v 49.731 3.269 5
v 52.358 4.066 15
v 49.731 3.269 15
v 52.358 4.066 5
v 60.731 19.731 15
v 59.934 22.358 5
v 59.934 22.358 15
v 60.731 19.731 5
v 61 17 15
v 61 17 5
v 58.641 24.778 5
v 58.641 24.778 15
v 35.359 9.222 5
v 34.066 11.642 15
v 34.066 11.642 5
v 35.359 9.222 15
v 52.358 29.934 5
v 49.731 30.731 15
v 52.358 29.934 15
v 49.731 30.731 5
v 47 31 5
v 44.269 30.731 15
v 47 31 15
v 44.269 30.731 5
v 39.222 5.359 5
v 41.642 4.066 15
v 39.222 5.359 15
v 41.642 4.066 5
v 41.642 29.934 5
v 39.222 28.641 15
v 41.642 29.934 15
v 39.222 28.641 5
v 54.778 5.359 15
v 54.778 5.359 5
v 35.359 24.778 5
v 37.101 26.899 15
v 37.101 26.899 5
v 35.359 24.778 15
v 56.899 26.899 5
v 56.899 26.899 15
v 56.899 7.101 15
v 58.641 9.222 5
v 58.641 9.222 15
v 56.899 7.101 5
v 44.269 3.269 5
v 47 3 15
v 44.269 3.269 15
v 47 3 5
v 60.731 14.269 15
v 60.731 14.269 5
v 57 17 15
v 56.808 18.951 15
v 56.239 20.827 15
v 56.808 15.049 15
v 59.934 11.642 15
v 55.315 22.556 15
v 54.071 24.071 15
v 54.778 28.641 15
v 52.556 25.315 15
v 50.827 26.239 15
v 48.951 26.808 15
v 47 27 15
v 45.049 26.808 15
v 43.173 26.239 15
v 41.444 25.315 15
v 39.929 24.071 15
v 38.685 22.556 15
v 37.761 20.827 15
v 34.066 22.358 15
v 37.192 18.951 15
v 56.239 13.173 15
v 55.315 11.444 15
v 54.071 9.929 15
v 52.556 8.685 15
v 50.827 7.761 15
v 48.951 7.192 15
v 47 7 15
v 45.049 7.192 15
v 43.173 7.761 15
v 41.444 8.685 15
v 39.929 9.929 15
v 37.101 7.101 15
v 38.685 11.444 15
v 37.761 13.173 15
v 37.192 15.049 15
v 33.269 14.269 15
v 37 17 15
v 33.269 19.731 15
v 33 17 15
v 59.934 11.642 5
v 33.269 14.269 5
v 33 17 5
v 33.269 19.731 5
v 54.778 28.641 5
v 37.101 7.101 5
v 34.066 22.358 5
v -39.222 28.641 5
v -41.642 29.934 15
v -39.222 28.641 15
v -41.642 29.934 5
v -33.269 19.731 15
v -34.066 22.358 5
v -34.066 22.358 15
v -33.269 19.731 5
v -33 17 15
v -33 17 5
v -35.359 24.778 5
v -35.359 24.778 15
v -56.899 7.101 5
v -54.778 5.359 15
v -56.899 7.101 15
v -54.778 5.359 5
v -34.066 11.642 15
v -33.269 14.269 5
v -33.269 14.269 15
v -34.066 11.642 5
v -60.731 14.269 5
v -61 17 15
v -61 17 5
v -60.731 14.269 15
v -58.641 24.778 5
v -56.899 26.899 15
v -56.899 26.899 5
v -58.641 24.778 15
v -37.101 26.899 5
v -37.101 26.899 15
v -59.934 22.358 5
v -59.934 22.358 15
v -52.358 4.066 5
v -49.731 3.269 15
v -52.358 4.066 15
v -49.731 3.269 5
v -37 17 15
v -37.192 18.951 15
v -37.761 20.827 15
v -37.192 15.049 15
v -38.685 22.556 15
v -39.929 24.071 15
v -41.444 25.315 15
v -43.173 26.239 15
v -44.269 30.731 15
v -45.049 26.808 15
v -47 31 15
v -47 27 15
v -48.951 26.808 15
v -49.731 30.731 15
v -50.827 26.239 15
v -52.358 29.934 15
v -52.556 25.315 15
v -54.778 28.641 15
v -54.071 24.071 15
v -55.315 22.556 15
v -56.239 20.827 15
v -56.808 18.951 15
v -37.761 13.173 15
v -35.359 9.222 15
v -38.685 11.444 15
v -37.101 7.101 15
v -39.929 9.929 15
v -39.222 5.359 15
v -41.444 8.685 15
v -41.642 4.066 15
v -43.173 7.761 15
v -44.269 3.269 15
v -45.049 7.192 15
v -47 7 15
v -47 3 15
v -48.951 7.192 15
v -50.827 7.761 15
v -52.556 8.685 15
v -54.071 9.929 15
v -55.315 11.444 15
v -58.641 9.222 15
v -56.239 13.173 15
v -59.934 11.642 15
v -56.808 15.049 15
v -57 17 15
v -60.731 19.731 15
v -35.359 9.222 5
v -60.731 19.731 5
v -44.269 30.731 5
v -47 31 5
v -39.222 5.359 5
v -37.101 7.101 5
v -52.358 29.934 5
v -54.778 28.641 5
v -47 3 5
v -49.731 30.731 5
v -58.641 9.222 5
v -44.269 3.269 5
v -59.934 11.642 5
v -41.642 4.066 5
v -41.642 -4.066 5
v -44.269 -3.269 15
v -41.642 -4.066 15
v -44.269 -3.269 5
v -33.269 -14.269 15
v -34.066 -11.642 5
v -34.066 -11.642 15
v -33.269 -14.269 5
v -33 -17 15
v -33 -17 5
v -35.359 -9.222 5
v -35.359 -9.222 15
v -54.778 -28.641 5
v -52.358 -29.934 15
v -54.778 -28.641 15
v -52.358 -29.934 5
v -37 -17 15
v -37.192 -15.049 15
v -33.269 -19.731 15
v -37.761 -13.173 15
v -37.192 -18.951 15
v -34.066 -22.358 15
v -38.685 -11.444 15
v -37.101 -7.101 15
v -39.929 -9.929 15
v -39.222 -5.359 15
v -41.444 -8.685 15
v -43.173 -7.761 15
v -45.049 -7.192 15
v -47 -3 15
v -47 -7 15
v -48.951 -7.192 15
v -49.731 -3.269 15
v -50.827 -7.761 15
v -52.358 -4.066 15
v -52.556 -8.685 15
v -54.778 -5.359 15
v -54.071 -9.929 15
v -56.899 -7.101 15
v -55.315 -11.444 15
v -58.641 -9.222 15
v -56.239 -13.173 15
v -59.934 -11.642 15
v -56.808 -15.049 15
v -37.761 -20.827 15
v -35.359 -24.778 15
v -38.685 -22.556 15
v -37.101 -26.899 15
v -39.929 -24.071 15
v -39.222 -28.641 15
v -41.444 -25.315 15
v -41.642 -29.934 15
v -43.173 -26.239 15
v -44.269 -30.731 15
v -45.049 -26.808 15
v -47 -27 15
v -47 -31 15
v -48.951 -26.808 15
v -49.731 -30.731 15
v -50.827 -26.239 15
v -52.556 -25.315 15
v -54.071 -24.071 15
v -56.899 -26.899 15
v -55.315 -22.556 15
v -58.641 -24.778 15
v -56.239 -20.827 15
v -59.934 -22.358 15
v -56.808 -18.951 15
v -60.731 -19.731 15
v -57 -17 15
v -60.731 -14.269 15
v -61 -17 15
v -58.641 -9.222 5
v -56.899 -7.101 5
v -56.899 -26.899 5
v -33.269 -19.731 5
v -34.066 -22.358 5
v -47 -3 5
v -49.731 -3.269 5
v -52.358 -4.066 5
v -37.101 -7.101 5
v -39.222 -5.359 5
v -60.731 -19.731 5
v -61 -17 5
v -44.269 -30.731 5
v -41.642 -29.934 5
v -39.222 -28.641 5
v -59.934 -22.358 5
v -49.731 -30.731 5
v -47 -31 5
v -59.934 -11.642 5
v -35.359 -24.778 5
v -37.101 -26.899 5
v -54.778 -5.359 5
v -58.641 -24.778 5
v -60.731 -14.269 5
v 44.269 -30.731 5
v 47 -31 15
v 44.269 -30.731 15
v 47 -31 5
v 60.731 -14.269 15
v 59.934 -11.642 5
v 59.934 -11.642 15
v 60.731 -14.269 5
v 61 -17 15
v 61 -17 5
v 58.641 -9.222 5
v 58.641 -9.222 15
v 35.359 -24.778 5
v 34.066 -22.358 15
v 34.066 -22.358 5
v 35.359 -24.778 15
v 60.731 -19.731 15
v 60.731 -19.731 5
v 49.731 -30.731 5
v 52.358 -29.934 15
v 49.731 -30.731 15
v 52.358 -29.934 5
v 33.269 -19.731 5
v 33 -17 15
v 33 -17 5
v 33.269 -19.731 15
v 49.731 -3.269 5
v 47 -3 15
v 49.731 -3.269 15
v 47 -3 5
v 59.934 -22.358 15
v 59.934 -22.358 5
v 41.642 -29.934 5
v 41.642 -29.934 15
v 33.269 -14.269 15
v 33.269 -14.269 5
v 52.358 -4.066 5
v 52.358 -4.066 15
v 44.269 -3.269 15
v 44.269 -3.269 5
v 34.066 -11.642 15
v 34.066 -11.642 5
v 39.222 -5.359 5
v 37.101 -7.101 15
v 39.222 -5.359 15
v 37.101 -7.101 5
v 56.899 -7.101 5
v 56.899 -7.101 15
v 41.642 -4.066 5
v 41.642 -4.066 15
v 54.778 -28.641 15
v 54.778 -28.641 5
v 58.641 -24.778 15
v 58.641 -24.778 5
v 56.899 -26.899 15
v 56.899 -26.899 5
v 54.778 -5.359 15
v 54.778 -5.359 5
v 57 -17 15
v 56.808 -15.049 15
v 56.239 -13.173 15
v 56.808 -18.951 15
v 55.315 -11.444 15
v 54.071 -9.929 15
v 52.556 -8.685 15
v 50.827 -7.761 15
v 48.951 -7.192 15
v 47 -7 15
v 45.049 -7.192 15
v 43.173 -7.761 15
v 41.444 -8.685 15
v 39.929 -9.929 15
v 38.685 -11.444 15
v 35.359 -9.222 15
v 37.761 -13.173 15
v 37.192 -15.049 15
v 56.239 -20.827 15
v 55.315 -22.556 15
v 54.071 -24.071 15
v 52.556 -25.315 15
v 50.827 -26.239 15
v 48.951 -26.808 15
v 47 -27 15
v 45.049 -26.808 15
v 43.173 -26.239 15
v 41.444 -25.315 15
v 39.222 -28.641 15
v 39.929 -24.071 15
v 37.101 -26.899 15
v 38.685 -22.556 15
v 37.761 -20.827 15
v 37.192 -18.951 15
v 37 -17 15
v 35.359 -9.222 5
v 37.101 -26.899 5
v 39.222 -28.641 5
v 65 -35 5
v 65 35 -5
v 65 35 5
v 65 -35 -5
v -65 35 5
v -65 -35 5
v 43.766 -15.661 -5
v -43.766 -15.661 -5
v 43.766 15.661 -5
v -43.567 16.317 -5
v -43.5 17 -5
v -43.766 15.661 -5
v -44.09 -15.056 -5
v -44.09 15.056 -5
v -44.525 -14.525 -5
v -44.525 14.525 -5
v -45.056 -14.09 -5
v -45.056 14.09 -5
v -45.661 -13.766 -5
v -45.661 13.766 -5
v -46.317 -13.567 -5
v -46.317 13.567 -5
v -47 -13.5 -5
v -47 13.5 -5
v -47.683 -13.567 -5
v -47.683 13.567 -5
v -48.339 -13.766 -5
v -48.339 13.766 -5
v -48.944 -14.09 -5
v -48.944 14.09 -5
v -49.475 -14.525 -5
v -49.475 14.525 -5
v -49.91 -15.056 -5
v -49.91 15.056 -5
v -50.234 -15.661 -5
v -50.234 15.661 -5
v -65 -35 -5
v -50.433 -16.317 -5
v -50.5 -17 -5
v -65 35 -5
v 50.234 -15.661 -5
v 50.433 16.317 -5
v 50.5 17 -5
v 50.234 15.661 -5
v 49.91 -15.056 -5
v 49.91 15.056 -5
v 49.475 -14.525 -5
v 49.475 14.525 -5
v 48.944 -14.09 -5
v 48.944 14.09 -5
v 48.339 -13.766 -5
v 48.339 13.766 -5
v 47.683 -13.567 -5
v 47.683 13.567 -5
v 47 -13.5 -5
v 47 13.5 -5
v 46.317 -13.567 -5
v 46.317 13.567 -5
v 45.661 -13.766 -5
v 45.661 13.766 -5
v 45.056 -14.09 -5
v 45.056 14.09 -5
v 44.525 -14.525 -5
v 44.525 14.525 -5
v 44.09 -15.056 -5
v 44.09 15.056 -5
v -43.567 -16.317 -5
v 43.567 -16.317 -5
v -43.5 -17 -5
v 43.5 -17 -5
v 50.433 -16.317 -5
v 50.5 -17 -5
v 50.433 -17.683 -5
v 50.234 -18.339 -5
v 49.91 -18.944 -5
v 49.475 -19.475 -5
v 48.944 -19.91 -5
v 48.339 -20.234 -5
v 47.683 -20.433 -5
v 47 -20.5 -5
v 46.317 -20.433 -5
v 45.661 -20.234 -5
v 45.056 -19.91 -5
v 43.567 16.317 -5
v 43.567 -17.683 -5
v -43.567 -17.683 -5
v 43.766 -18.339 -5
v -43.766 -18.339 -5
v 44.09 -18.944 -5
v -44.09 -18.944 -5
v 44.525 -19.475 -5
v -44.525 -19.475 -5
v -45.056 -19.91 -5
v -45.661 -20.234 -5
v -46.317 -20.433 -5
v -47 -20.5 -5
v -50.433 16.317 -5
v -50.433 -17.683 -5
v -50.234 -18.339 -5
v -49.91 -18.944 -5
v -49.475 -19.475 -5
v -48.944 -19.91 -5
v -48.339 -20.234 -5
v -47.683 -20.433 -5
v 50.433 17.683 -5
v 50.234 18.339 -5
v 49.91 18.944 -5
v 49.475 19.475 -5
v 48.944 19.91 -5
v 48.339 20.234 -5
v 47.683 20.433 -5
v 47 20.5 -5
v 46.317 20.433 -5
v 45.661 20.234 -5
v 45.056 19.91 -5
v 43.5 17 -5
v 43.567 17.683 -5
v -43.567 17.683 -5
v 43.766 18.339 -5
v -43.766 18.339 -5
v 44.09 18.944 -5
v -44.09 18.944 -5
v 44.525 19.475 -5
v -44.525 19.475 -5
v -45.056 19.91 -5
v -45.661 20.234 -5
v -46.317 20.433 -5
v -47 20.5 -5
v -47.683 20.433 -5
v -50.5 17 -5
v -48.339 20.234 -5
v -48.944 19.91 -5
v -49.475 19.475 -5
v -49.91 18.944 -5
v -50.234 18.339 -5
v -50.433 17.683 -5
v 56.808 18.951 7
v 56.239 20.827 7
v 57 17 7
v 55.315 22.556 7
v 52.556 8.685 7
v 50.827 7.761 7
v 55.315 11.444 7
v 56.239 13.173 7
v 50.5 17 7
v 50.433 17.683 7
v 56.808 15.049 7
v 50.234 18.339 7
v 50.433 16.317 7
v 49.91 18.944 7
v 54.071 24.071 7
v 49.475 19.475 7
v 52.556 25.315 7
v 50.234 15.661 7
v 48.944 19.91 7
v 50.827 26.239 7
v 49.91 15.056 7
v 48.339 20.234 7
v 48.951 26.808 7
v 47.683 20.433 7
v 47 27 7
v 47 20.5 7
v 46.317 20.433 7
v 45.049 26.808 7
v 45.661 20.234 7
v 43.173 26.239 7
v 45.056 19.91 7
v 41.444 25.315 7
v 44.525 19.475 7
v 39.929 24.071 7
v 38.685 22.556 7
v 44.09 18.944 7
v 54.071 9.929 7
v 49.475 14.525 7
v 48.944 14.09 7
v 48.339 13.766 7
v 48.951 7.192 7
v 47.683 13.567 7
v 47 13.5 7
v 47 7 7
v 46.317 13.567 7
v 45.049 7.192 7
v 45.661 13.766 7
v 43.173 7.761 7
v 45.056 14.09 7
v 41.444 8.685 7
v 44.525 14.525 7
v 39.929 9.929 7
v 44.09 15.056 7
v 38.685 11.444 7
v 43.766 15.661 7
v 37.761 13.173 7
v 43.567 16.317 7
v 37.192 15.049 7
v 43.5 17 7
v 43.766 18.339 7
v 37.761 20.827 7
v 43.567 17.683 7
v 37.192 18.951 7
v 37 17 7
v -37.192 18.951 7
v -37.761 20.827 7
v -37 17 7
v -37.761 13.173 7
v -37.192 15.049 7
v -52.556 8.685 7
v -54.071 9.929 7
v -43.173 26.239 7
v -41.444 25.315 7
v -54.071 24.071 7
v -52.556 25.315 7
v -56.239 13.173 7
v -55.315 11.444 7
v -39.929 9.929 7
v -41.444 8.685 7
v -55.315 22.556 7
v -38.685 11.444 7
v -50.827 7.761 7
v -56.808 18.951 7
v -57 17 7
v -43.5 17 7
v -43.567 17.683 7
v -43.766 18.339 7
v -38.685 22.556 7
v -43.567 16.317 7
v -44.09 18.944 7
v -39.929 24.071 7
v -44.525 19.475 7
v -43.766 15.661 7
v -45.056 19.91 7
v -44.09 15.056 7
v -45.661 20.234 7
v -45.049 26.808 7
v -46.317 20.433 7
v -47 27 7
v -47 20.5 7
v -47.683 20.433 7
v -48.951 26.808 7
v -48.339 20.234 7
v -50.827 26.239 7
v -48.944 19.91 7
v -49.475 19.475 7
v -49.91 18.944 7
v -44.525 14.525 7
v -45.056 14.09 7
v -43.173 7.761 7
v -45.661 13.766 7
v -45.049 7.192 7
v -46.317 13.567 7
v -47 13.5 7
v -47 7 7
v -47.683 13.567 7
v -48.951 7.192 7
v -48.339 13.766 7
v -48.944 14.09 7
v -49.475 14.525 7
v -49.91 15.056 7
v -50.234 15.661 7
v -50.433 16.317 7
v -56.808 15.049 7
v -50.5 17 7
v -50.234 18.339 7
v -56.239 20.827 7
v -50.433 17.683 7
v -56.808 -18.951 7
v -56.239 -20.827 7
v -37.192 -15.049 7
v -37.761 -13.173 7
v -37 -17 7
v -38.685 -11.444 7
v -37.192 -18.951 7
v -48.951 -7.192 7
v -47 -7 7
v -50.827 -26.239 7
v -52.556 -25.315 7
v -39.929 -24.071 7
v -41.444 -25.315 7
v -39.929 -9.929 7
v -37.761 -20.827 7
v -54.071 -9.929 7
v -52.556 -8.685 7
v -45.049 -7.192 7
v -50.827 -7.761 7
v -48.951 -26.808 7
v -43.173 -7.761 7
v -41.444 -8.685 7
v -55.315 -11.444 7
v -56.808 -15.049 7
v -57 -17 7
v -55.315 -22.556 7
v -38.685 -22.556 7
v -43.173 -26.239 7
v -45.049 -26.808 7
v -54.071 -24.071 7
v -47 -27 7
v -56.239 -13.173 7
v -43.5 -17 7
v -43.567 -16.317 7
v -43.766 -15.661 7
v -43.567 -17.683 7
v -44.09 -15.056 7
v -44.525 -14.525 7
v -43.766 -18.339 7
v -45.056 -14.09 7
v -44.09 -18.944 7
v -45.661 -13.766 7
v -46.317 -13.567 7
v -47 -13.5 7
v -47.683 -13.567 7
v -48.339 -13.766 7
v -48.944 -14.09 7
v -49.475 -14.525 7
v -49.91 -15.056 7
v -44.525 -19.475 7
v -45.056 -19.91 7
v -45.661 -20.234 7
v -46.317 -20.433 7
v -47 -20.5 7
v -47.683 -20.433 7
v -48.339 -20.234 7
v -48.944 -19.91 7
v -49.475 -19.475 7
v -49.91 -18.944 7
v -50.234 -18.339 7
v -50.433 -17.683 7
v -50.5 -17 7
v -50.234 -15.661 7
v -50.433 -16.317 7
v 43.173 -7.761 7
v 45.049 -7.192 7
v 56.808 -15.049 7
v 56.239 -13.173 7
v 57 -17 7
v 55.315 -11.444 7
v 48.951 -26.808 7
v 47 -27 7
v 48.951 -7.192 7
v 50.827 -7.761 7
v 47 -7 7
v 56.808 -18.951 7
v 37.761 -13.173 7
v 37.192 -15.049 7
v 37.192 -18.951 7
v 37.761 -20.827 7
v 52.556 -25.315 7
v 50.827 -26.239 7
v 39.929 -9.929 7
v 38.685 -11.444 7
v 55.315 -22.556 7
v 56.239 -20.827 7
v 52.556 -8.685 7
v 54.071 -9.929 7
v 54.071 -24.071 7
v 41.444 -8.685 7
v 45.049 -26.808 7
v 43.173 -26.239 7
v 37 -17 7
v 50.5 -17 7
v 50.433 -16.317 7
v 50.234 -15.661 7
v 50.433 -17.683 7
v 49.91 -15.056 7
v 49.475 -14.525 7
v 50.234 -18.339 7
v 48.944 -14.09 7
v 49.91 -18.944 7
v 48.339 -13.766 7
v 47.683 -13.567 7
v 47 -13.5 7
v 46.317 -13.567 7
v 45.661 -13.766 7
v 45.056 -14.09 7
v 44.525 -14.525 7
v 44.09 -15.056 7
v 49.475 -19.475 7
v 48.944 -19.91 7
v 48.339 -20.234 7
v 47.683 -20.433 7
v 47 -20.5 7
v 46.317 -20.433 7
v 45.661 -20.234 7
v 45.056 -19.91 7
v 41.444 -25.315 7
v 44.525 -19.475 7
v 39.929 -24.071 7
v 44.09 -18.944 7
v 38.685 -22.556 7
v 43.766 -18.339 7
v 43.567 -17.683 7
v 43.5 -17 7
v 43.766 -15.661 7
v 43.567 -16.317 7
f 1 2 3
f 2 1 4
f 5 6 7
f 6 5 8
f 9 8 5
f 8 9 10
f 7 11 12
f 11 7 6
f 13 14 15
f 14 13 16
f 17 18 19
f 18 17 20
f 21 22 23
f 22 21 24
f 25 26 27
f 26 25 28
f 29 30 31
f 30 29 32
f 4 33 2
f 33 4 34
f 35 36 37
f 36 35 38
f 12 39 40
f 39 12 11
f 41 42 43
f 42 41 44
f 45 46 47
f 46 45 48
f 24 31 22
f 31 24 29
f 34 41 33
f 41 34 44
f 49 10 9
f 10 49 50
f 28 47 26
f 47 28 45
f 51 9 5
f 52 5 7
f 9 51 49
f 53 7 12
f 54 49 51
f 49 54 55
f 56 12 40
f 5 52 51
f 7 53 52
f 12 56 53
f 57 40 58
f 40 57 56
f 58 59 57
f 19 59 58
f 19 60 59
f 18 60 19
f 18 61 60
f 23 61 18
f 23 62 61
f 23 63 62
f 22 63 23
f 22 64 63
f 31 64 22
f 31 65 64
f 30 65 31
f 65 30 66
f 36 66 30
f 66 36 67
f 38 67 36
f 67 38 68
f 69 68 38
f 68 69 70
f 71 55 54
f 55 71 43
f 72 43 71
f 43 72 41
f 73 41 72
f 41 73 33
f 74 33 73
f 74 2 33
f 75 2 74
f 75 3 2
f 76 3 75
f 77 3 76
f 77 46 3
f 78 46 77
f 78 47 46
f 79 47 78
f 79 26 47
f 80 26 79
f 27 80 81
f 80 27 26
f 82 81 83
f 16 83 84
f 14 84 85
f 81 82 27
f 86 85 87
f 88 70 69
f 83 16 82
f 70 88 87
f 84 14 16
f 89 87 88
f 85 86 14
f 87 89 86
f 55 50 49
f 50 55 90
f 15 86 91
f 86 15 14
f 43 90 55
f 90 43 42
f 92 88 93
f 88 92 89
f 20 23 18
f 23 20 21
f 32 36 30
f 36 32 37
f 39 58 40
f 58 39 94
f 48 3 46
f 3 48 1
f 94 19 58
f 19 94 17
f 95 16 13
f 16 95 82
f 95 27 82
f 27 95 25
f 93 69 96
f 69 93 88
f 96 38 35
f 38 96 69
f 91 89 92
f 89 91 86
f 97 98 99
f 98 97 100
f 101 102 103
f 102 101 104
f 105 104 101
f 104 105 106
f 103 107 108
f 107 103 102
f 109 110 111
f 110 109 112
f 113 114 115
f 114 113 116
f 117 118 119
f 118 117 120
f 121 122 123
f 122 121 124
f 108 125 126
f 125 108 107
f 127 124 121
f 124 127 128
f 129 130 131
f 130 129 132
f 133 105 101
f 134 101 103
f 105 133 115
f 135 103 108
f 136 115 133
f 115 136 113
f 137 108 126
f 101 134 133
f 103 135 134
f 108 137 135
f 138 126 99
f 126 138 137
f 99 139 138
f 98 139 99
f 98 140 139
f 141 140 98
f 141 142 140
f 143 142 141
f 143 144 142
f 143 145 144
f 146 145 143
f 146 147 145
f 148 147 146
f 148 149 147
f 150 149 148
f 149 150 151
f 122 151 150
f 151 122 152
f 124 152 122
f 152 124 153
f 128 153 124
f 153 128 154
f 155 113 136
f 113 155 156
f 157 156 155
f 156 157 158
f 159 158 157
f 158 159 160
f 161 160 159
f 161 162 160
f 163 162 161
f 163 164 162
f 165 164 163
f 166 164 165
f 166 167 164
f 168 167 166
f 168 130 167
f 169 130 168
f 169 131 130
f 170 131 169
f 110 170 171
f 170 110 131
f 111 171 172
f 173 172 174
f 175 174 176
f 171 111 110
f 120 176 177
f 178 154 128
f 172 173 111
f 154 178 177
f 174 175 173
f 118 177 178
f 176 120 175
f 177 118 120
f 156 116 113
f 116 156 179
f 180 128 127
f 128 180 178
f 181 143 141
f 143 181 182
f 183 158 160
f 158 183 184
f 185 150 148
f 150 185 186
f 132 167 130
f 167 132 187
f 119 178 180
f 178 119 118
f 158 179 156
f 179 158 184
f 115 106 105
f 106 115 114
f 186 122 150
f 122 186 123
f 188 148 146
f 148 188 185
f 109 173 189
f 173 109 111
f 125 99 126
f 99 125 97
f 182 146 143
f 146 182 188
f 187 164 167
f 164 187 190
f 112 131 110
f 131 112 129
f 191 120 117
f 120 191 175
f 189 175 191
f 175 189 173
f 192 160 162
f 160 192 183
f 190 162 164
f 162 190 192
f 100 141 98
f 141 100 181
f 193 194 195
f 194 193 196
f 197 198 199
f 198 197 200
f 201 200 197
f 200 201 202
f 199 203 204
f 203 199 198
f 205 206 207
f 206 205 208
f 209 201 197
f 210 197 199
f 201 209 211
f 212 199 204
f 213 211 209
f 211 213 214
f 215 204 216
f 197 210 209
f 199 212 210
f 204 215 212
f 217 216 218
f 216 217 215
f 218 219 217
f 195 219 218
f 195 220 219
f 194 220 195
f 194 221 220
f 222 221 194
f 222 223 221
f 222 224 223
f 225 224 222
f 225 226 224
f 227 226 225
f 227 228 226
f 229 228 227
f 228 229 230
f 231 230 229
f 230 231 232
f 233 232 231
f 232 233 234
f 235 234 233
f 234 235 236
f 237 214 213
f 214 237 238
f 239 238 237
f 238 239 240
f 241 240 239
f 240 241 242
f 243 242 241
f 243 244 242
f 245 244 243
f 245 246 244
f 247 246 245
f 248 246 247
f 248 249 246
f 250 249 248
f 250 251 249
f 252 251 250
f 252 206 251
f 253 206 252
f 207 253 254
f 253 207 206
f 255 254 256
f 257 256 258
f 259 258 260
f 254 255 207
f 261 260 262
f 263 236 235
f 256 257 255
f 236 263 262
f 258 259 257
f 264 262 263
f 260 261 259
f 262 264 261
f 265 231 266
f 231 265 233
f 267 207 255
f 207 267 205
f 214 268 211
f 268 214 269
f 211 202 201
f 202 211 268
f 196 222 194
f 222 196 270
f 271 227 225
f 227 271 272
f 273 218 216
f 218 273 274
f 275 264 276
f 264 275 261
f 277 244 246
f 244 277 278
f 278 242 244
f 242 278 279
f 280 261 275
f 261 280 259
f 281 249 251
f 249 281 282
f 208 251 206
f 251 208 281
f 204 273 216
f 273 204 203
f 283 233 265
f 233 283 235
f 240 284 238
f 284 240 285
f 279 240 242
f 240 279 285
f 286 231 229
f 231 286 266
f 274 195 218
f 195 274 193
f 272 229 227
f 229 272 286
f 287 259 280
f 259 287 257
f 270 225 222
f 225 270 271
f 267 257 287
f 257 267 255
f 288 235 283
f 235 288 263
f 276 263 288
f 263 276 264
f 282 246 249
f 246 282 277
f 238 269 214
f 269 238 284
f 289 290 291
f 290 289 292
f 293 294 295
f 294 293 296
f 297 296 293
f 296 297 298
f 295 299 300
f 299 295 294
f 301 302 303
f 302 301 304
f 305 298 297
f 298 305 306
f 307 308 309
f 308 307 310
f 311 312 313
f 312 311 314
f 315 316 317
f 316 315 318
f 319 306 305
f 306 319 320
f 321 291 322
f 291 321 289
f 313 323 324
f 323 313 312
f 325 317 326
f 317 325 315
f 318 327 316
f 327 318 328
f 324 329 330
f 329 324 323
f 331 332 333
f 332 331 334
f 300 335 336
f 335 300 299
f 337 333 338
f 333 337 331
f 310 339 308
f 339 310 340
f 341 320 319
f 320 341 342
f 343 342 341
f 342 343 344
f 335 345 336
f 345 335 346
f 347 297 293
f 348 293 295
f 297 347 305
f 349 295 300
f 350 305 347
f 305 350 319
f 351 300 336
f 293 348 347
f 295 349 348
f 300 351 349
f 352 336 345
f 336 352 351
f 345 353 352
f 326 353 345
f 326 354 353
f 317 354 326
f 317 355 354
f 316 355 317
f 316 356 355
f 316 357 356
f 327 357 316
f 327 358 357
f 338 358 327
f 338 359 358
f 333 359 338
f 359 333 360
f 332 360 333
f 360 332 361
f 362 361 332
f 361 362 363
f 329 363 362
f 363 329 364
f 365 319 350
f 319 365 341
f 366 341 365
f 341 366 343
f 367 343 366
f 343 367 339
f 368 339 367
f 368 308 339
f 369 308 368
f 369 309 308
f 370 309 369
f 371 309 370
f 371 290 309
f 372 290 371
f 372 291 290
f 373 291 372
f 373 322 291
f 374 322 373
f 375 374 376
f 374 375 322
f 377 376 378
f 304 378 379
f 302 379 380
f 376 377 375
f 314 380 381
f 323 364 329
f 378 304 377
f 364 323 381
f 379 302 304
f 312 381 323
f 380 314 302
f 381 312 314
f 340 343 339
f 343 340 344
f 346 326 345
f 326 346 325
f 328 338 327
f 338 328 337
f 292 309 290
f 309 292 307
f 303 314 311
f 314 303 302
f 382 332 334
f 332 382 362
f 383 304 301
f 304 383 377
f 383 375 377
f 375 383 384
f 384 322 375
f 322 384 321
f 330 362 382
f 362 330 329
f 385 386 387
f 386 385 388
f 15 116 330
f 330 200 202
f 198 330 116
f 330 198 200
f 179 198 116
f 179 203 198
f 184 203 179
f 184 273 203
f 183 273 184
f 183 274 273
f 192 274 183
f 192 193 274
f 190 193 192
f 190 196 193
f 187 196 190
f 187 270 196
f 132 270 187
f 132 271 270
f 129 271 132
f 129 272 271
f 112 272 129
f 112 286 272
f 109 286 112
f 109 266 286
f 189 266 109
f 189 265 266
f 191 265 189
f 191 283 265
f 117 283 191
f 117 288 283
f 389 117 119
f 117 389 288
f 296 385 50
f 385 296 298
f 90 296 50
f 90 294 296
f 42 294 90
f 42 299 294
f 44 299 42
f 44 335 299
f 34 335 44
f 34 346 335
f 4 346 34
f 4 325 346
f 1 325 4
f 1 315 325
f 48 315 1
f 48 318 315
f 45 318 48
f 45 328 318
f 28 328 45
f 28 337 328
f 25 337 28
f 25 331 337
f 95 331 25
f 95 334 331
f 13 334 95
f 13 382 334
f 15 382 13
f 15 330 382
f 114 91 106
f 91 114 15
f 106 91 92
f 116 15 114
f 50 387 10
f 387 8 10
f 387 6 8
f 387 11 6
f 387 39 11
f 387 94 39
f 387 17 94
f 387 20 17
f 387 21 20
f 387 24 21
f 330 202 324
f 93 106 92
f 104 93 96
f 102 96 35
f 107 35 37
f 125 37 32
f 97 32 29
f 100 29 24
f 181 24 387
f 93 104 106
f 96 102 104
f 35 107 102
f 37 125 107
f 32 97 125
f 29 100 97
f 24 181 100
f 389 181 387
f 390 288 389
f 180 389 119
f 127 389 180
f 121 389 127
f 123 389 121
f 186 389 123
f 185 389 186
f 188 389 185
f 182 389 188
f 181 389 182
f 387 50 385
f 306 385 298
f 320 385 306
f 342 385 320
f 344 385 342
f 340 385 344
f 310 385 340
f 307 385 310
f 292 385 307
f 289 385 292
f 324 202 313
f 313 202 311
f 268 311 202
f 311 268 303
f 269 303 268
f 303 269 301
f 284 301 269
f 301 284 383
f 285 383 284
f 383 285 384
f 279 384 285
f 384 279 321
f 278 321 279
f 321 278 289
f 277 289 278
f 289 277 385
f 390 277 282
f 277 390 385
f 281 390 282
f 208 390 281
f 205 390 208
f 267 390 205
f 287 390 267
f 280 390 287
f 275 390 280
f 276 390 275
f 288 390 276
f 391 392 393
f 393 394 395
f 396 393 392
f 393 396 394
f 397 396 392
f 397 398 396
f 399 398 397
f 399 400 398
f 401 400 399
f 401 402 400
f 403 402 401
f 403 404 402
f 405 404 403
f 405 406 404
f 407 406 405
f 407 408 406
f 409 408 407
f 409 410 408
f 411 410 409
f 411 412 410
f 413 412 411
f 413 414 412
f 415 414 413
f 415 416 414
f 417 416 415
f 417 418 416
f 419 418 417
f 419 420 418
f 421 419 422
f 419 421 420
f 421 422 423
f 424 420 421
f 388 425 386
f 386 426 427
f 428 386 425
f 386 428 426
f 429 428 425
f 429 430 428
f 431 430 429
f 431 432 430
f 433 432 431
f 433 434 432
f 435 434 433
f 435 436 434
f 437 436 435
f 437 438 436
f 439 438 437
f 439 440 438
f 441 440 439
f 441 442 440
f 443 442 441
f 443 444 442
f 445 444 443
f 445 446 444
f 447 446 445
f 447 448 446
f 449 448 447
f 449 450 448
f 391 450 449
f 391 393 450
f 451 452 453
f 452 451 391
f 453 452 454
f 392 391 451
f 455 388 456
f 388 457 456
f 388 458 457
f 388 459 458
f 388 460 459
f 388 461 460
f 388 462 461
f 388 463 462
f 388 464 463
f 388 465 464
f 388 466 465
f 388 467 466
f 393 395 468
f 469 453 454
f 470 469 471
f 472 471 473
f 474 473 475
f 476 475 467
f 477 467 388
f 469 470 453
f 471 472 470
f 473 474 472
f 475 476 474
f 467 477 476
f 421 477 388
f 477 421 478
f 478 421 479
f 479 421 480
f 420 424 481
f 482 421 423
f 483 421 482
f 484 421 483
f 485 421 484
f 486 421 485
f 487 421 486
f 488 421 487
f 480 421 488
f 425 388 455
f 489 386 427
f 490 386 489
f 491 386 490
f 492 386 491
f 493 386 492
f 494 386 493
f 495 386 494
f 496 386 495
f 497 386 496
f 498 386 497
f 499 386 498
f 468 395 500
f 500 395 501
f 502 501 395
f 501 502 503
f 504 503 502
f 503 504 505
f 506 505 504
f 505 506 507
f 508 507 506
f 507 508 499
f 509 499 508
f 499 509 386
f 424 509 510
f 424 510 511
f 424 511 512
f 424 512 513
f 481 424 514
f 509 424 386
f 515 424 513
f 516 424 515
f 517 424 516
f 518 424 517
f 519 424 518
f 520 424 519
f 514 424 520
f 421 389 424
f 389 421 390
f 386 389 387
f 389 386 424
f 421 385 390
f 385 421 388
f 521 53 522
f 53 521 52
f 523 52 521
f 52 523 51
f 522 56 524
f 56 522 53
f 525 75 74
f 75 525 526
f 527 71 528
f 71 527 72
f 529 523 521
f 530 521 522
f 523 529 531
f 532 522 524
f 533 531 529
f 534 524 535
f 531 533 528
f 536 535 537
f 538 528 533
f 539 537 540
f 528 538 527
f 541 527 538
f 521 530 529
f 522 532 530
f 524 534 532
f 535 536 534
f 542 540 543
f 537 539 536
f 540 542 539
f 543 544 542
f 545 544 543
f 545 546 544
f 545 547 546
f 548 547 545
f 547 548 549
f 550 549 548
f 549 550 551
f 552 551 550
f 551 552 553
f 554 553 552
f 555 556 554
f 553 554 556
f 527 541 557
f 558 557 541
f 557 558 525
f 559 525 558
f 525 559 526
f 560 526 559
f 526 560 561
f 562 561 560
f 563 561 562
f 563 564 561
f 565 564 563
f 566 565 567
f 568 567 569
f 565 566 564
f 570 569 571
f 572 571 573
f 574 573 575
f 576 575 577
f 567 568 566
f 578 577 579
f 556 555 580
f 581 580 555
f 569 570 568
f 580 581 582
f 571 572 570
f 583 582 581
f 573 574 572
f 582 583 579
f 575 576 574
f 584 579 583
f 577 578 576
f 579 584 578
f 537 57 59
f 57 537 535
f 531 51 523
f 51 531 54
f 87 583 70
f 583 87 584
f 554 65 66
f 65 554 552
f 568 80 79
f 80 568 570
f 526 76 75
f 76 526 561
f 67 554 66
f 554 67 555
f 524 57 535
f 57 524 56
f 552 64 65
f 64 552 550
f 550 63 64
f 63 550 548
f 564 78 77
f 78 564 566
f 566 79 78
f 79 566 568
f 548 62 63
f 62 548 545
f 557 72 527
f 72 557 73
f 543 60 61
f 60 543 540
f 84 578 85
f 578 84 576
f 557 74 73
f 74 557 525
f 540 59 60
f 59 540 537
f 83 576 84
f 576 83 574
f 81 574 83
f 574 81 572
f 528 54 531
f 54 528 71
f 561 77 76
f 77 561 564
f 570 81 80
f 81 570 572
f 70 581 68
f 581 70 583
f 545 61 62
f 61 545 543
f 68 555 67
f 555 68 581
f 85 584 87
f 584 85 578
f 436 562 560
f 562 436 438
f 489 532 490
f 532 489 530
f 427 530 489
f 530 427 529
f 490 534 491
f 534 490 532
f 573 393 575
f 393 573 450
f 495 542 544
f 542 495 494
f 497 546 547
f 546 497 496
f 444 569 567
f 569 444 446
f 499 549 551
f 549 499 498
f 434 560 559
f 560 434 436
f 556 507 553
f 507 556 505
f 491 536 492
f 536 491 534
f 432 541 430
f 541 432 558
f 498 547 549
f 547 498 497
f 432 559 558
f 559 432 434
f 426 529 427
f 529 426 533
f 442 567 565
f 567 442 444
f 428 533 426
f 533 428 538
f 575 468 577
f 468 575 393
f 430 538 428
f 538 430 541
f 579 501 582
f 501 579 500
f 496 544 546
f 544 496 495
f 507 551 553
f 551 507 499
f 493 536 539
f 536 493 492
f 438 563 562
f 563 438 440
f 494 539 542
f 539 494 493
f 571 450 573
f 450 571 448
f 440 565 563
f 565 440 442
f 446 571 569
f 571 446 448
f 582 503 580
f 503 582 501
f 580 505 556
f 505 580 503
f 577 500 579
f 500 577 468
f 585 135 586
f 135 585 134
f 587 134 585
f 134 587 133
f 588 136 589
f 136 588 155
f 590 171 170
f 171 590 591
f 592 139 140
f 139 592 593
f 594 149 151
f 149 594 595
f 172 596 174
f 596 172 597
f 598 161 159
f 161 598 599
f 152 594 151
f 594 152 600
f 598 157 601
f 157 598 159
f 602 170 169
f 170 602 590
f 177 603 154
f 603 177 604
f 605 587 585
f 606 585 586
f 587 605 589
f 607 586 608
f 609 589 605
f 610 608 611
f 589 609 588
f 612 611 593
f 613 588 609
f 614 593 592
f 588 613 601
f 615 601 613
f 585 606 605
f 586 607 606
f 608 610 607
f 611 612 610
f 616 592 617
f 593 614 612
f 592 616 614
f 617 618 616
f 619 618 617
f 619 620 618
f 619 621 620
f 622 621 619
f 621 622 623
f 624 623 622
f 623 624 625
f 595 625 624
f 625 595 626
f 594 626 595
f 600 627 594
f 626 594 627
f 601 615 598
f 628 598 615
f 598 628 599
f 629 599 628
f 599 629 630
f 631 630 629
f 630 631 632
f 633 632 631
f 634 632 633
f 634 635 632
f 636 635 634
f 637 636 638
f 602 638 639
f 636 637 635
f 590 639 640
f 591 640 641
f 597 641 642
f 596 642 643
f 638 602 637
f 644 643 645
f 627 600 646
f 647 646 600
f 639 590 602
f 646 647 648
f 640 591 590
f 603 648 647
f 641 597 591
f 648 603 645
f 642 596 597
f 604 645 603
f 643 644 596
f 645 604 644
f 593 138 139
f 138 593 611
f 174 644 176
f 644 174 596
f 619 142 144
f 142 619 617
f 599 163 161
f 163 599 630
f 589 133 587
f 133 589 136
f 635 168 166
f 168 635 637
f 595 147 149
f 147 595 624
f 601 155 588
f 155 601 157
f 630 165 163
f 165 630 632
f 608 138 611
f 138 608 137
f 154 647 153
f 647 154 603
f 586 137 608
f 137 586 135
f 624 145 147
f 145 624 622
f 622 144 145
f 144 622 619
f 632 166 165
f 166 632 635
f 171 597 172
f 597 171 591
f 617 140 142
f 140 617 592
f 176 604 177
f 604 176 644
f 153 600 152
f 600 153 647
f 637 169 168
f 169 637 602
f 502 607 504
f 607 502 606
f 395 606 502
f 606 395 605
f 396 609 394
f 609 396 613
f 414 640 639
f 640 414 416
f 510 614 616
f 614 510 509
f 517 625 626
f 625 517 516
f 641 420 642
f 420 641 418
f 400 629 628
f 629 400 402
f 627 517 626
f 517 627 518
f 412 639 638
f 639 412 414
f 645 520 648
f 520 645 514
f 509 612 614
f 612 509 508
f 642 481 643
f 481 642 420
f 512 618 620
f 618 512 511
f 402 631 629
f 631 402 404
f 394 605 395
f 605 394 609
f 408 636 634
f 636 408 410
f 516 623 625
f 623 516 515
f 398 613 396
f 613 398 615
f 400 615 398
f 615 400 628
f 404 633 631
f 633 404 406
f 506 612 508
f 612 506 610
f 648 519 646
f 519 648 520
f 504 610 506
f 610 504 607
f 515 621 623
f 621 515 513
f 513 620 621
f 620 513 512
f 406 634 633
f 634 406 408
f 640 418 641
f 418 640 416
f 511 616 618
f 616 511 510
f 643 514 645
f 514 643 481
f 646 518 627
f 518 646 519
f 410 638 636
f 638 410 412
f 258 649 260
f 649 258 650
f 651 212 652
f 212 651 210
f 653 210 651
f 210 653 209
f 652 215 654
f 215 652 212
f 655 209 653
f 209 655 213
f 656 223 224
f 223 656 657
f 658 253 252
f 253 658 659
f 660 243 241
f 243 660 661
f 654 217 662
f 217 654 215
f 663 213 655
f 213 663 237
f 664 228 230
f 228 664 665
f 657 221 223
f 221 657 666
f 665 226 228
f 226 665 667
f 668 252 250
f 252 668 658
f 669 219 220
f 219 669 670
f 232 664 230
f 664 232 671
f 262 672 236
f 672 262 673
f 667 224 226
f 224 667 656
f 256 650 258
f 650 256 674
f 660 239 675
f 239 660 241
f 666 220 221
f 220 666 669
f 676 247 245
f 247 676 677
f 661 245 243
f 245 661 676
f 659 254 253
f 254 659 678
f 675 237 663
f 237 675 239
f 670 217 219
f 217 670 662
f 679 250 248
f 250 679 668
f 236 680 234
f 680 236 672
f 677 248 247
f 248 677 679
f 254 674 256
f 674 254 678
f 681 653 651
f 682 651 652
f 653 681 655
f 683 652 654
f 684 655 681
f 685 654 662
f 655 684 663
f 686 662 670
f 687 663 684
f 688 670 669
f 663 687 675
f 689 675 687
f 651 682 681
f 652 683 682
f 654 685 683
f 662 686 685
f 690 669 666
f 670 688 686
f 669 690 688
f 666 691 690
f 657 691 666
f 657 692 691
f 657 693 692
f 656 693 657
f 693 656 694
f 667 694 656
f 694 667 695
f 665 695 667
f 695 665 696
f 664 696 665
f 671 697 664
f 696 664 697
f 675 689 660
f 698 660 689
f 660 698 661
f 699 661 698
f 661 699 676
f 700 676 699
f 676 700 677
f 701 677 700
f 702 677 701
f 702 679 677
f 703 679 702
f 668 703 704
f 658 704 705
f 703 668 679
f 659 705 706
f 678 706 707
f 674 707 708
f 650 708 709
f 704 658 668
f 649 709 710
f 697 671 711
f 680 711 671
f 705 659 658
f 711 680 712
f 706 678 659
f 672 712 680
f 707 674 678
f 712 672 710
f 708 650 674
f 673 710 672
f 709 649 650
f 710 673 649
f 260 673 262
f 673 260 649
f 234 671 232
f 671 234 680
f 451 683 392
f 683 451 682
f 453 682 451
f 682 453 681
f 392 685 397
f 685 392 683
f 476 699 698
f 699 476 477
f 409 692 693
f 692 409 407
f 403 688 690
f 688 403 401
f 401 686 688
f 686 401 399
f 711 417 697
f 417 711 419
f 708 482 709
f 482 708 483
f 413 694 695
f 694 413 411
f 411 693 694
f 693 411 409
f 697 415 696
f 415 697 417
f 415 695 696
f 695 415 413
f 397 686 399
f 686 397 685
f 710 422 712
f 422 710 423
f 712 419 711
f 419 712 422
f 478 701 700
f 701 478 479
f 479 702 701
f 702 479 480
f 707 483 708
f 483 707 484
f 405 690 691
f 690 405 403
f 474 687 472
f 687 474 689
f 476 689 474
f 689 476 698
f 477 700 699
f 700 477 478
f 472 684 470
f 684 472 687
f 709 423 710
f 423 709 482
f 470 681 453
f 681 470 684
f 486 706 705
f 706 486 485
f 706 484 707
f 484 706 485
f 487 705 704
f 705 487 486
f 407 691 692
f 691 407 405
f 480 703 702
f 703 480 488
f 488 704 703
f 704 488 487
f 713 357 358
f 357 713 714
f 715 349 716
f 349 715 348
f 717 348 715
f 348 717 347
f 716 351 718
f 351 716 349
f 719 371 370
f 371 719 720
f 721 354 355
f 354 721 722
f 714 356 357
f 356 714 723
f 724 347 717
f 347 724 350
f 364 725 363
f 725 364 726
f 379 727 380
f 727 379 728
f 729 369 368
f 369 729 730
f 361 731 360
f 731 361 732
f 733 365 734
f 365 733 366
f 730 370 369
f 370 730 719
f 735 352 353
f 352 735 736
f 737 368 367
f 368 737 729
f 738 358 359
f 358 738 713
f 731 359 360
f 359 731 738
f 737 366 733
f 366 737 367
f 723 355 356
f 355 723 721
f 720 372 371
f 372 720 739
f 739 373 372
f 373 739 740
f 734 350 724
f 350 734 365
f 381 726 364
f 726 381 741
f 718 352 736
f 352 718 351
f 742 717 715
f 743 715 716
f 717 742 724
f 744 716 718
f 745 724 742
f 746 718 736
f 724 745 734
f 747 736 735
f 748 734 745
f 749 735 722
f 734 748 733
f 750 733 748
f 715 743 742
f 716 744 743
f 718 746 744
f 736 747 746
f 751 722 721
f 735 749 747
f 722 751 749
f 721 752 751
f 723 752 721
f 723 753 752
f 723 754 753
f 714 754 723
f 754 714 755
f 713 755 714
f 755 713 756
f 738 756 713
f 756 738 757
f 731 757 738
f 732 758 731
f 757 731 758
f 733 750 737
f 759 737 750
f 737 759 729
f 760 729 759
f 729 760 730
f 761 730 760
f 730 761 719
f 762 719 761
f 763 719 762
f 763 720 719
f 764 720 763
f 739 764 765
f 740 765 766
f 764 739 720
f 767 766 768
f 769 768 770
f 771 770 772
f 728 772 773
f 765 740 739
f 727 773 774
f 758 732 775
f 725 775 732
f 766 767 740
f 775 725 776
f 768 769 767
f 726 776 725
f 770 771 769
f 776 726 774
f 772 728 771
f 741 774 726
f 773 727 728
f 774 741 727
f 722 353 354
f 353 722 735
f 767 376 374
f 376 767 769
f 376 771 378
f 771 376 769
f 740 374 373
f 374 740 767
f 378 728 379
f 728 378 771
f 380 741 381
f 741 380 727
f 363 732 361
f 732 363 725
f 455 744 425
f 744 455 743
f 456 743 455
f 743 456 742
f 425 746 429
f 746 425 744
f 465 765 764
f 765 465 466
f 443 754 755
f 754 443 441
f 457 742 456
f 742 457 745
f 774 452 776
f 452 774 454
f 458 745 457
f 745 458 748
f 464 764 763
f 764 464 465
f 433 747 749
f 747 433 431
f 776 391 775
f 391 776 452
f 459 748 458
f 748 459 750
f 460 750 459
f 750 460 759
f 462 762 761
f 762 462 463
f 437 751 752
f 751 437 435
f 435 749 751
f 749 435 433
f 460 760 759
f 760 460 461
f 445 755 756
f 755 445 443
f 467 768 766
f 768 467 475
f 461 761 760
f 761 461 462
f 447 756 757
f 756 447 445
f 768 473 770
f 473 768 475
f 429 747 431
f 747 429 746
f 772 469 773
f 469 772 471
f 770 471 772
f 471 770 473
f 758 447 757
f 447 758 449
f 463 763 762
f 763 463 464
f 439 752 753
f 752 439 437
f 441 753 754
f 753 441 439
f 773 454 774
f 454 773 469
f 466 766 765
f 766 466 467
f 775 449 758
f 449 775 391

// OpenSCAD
$fn = 32;

// ----------------------------------------------------------------------
// Socket pad plate
// bosses with counterbored sockets for the screws
// ----------------------------------------------------------------------

// --- parameters (mm) ---
base_t = 10;            // base plate thickness
boss_h = 10;            // boss height above the base plate
boss_d = 28;            // boss diameter
socket_d = 20;          // socket diameter
socket_depth = 8;       // socket depth from the boss face
bolt_d = 7;             // screw clearance hole through the socket floor
plate = [130, 70, 10];  // overall size (x, y, z)
edge = 18;              // boss centre offset from the plate edge
pads = 4;               // boss count, one per corner

// --- derived feature positions (mm) ---
height = base_t + boss_h;        // = 20   overall height of the part
corner_x = plate[0] / 2 - edge;  // = 47   boss centre X
corner_y = plate[1] / 2 - edge;  // = 17   boss centre Y
feature_centers = [
  [corner_x, corner_y],
  [-corner_x, corner_y],
  [-corner_x, -corner_y],
  [corner_x, -corner_y]
];   // boss centres: sockets, holes and the pads themselves are placed from here

// base plate, bosses on feature_centers, socket + through hole in each
difference() {
  union() {
    cube(plate, center = true);
    for (centre = feature_centers)
      translate([centre[0], centre[1], plate[2] / 2 - 1])
        cylinder(d = boss_d, h = boss_h + 1);
  }
  for (centre = feature_centers) {
    translate([centre[0], centre[1], plate[2] / 2 + boss_h - socket_depth])
      cylinder(d = socket_d, h = socket_depth + 1);
    translate([centre[0], centre[1], -height])
      cylinder(d = bolt_d, h = 2 * height + 2);  // through the socket floor
  }
}
